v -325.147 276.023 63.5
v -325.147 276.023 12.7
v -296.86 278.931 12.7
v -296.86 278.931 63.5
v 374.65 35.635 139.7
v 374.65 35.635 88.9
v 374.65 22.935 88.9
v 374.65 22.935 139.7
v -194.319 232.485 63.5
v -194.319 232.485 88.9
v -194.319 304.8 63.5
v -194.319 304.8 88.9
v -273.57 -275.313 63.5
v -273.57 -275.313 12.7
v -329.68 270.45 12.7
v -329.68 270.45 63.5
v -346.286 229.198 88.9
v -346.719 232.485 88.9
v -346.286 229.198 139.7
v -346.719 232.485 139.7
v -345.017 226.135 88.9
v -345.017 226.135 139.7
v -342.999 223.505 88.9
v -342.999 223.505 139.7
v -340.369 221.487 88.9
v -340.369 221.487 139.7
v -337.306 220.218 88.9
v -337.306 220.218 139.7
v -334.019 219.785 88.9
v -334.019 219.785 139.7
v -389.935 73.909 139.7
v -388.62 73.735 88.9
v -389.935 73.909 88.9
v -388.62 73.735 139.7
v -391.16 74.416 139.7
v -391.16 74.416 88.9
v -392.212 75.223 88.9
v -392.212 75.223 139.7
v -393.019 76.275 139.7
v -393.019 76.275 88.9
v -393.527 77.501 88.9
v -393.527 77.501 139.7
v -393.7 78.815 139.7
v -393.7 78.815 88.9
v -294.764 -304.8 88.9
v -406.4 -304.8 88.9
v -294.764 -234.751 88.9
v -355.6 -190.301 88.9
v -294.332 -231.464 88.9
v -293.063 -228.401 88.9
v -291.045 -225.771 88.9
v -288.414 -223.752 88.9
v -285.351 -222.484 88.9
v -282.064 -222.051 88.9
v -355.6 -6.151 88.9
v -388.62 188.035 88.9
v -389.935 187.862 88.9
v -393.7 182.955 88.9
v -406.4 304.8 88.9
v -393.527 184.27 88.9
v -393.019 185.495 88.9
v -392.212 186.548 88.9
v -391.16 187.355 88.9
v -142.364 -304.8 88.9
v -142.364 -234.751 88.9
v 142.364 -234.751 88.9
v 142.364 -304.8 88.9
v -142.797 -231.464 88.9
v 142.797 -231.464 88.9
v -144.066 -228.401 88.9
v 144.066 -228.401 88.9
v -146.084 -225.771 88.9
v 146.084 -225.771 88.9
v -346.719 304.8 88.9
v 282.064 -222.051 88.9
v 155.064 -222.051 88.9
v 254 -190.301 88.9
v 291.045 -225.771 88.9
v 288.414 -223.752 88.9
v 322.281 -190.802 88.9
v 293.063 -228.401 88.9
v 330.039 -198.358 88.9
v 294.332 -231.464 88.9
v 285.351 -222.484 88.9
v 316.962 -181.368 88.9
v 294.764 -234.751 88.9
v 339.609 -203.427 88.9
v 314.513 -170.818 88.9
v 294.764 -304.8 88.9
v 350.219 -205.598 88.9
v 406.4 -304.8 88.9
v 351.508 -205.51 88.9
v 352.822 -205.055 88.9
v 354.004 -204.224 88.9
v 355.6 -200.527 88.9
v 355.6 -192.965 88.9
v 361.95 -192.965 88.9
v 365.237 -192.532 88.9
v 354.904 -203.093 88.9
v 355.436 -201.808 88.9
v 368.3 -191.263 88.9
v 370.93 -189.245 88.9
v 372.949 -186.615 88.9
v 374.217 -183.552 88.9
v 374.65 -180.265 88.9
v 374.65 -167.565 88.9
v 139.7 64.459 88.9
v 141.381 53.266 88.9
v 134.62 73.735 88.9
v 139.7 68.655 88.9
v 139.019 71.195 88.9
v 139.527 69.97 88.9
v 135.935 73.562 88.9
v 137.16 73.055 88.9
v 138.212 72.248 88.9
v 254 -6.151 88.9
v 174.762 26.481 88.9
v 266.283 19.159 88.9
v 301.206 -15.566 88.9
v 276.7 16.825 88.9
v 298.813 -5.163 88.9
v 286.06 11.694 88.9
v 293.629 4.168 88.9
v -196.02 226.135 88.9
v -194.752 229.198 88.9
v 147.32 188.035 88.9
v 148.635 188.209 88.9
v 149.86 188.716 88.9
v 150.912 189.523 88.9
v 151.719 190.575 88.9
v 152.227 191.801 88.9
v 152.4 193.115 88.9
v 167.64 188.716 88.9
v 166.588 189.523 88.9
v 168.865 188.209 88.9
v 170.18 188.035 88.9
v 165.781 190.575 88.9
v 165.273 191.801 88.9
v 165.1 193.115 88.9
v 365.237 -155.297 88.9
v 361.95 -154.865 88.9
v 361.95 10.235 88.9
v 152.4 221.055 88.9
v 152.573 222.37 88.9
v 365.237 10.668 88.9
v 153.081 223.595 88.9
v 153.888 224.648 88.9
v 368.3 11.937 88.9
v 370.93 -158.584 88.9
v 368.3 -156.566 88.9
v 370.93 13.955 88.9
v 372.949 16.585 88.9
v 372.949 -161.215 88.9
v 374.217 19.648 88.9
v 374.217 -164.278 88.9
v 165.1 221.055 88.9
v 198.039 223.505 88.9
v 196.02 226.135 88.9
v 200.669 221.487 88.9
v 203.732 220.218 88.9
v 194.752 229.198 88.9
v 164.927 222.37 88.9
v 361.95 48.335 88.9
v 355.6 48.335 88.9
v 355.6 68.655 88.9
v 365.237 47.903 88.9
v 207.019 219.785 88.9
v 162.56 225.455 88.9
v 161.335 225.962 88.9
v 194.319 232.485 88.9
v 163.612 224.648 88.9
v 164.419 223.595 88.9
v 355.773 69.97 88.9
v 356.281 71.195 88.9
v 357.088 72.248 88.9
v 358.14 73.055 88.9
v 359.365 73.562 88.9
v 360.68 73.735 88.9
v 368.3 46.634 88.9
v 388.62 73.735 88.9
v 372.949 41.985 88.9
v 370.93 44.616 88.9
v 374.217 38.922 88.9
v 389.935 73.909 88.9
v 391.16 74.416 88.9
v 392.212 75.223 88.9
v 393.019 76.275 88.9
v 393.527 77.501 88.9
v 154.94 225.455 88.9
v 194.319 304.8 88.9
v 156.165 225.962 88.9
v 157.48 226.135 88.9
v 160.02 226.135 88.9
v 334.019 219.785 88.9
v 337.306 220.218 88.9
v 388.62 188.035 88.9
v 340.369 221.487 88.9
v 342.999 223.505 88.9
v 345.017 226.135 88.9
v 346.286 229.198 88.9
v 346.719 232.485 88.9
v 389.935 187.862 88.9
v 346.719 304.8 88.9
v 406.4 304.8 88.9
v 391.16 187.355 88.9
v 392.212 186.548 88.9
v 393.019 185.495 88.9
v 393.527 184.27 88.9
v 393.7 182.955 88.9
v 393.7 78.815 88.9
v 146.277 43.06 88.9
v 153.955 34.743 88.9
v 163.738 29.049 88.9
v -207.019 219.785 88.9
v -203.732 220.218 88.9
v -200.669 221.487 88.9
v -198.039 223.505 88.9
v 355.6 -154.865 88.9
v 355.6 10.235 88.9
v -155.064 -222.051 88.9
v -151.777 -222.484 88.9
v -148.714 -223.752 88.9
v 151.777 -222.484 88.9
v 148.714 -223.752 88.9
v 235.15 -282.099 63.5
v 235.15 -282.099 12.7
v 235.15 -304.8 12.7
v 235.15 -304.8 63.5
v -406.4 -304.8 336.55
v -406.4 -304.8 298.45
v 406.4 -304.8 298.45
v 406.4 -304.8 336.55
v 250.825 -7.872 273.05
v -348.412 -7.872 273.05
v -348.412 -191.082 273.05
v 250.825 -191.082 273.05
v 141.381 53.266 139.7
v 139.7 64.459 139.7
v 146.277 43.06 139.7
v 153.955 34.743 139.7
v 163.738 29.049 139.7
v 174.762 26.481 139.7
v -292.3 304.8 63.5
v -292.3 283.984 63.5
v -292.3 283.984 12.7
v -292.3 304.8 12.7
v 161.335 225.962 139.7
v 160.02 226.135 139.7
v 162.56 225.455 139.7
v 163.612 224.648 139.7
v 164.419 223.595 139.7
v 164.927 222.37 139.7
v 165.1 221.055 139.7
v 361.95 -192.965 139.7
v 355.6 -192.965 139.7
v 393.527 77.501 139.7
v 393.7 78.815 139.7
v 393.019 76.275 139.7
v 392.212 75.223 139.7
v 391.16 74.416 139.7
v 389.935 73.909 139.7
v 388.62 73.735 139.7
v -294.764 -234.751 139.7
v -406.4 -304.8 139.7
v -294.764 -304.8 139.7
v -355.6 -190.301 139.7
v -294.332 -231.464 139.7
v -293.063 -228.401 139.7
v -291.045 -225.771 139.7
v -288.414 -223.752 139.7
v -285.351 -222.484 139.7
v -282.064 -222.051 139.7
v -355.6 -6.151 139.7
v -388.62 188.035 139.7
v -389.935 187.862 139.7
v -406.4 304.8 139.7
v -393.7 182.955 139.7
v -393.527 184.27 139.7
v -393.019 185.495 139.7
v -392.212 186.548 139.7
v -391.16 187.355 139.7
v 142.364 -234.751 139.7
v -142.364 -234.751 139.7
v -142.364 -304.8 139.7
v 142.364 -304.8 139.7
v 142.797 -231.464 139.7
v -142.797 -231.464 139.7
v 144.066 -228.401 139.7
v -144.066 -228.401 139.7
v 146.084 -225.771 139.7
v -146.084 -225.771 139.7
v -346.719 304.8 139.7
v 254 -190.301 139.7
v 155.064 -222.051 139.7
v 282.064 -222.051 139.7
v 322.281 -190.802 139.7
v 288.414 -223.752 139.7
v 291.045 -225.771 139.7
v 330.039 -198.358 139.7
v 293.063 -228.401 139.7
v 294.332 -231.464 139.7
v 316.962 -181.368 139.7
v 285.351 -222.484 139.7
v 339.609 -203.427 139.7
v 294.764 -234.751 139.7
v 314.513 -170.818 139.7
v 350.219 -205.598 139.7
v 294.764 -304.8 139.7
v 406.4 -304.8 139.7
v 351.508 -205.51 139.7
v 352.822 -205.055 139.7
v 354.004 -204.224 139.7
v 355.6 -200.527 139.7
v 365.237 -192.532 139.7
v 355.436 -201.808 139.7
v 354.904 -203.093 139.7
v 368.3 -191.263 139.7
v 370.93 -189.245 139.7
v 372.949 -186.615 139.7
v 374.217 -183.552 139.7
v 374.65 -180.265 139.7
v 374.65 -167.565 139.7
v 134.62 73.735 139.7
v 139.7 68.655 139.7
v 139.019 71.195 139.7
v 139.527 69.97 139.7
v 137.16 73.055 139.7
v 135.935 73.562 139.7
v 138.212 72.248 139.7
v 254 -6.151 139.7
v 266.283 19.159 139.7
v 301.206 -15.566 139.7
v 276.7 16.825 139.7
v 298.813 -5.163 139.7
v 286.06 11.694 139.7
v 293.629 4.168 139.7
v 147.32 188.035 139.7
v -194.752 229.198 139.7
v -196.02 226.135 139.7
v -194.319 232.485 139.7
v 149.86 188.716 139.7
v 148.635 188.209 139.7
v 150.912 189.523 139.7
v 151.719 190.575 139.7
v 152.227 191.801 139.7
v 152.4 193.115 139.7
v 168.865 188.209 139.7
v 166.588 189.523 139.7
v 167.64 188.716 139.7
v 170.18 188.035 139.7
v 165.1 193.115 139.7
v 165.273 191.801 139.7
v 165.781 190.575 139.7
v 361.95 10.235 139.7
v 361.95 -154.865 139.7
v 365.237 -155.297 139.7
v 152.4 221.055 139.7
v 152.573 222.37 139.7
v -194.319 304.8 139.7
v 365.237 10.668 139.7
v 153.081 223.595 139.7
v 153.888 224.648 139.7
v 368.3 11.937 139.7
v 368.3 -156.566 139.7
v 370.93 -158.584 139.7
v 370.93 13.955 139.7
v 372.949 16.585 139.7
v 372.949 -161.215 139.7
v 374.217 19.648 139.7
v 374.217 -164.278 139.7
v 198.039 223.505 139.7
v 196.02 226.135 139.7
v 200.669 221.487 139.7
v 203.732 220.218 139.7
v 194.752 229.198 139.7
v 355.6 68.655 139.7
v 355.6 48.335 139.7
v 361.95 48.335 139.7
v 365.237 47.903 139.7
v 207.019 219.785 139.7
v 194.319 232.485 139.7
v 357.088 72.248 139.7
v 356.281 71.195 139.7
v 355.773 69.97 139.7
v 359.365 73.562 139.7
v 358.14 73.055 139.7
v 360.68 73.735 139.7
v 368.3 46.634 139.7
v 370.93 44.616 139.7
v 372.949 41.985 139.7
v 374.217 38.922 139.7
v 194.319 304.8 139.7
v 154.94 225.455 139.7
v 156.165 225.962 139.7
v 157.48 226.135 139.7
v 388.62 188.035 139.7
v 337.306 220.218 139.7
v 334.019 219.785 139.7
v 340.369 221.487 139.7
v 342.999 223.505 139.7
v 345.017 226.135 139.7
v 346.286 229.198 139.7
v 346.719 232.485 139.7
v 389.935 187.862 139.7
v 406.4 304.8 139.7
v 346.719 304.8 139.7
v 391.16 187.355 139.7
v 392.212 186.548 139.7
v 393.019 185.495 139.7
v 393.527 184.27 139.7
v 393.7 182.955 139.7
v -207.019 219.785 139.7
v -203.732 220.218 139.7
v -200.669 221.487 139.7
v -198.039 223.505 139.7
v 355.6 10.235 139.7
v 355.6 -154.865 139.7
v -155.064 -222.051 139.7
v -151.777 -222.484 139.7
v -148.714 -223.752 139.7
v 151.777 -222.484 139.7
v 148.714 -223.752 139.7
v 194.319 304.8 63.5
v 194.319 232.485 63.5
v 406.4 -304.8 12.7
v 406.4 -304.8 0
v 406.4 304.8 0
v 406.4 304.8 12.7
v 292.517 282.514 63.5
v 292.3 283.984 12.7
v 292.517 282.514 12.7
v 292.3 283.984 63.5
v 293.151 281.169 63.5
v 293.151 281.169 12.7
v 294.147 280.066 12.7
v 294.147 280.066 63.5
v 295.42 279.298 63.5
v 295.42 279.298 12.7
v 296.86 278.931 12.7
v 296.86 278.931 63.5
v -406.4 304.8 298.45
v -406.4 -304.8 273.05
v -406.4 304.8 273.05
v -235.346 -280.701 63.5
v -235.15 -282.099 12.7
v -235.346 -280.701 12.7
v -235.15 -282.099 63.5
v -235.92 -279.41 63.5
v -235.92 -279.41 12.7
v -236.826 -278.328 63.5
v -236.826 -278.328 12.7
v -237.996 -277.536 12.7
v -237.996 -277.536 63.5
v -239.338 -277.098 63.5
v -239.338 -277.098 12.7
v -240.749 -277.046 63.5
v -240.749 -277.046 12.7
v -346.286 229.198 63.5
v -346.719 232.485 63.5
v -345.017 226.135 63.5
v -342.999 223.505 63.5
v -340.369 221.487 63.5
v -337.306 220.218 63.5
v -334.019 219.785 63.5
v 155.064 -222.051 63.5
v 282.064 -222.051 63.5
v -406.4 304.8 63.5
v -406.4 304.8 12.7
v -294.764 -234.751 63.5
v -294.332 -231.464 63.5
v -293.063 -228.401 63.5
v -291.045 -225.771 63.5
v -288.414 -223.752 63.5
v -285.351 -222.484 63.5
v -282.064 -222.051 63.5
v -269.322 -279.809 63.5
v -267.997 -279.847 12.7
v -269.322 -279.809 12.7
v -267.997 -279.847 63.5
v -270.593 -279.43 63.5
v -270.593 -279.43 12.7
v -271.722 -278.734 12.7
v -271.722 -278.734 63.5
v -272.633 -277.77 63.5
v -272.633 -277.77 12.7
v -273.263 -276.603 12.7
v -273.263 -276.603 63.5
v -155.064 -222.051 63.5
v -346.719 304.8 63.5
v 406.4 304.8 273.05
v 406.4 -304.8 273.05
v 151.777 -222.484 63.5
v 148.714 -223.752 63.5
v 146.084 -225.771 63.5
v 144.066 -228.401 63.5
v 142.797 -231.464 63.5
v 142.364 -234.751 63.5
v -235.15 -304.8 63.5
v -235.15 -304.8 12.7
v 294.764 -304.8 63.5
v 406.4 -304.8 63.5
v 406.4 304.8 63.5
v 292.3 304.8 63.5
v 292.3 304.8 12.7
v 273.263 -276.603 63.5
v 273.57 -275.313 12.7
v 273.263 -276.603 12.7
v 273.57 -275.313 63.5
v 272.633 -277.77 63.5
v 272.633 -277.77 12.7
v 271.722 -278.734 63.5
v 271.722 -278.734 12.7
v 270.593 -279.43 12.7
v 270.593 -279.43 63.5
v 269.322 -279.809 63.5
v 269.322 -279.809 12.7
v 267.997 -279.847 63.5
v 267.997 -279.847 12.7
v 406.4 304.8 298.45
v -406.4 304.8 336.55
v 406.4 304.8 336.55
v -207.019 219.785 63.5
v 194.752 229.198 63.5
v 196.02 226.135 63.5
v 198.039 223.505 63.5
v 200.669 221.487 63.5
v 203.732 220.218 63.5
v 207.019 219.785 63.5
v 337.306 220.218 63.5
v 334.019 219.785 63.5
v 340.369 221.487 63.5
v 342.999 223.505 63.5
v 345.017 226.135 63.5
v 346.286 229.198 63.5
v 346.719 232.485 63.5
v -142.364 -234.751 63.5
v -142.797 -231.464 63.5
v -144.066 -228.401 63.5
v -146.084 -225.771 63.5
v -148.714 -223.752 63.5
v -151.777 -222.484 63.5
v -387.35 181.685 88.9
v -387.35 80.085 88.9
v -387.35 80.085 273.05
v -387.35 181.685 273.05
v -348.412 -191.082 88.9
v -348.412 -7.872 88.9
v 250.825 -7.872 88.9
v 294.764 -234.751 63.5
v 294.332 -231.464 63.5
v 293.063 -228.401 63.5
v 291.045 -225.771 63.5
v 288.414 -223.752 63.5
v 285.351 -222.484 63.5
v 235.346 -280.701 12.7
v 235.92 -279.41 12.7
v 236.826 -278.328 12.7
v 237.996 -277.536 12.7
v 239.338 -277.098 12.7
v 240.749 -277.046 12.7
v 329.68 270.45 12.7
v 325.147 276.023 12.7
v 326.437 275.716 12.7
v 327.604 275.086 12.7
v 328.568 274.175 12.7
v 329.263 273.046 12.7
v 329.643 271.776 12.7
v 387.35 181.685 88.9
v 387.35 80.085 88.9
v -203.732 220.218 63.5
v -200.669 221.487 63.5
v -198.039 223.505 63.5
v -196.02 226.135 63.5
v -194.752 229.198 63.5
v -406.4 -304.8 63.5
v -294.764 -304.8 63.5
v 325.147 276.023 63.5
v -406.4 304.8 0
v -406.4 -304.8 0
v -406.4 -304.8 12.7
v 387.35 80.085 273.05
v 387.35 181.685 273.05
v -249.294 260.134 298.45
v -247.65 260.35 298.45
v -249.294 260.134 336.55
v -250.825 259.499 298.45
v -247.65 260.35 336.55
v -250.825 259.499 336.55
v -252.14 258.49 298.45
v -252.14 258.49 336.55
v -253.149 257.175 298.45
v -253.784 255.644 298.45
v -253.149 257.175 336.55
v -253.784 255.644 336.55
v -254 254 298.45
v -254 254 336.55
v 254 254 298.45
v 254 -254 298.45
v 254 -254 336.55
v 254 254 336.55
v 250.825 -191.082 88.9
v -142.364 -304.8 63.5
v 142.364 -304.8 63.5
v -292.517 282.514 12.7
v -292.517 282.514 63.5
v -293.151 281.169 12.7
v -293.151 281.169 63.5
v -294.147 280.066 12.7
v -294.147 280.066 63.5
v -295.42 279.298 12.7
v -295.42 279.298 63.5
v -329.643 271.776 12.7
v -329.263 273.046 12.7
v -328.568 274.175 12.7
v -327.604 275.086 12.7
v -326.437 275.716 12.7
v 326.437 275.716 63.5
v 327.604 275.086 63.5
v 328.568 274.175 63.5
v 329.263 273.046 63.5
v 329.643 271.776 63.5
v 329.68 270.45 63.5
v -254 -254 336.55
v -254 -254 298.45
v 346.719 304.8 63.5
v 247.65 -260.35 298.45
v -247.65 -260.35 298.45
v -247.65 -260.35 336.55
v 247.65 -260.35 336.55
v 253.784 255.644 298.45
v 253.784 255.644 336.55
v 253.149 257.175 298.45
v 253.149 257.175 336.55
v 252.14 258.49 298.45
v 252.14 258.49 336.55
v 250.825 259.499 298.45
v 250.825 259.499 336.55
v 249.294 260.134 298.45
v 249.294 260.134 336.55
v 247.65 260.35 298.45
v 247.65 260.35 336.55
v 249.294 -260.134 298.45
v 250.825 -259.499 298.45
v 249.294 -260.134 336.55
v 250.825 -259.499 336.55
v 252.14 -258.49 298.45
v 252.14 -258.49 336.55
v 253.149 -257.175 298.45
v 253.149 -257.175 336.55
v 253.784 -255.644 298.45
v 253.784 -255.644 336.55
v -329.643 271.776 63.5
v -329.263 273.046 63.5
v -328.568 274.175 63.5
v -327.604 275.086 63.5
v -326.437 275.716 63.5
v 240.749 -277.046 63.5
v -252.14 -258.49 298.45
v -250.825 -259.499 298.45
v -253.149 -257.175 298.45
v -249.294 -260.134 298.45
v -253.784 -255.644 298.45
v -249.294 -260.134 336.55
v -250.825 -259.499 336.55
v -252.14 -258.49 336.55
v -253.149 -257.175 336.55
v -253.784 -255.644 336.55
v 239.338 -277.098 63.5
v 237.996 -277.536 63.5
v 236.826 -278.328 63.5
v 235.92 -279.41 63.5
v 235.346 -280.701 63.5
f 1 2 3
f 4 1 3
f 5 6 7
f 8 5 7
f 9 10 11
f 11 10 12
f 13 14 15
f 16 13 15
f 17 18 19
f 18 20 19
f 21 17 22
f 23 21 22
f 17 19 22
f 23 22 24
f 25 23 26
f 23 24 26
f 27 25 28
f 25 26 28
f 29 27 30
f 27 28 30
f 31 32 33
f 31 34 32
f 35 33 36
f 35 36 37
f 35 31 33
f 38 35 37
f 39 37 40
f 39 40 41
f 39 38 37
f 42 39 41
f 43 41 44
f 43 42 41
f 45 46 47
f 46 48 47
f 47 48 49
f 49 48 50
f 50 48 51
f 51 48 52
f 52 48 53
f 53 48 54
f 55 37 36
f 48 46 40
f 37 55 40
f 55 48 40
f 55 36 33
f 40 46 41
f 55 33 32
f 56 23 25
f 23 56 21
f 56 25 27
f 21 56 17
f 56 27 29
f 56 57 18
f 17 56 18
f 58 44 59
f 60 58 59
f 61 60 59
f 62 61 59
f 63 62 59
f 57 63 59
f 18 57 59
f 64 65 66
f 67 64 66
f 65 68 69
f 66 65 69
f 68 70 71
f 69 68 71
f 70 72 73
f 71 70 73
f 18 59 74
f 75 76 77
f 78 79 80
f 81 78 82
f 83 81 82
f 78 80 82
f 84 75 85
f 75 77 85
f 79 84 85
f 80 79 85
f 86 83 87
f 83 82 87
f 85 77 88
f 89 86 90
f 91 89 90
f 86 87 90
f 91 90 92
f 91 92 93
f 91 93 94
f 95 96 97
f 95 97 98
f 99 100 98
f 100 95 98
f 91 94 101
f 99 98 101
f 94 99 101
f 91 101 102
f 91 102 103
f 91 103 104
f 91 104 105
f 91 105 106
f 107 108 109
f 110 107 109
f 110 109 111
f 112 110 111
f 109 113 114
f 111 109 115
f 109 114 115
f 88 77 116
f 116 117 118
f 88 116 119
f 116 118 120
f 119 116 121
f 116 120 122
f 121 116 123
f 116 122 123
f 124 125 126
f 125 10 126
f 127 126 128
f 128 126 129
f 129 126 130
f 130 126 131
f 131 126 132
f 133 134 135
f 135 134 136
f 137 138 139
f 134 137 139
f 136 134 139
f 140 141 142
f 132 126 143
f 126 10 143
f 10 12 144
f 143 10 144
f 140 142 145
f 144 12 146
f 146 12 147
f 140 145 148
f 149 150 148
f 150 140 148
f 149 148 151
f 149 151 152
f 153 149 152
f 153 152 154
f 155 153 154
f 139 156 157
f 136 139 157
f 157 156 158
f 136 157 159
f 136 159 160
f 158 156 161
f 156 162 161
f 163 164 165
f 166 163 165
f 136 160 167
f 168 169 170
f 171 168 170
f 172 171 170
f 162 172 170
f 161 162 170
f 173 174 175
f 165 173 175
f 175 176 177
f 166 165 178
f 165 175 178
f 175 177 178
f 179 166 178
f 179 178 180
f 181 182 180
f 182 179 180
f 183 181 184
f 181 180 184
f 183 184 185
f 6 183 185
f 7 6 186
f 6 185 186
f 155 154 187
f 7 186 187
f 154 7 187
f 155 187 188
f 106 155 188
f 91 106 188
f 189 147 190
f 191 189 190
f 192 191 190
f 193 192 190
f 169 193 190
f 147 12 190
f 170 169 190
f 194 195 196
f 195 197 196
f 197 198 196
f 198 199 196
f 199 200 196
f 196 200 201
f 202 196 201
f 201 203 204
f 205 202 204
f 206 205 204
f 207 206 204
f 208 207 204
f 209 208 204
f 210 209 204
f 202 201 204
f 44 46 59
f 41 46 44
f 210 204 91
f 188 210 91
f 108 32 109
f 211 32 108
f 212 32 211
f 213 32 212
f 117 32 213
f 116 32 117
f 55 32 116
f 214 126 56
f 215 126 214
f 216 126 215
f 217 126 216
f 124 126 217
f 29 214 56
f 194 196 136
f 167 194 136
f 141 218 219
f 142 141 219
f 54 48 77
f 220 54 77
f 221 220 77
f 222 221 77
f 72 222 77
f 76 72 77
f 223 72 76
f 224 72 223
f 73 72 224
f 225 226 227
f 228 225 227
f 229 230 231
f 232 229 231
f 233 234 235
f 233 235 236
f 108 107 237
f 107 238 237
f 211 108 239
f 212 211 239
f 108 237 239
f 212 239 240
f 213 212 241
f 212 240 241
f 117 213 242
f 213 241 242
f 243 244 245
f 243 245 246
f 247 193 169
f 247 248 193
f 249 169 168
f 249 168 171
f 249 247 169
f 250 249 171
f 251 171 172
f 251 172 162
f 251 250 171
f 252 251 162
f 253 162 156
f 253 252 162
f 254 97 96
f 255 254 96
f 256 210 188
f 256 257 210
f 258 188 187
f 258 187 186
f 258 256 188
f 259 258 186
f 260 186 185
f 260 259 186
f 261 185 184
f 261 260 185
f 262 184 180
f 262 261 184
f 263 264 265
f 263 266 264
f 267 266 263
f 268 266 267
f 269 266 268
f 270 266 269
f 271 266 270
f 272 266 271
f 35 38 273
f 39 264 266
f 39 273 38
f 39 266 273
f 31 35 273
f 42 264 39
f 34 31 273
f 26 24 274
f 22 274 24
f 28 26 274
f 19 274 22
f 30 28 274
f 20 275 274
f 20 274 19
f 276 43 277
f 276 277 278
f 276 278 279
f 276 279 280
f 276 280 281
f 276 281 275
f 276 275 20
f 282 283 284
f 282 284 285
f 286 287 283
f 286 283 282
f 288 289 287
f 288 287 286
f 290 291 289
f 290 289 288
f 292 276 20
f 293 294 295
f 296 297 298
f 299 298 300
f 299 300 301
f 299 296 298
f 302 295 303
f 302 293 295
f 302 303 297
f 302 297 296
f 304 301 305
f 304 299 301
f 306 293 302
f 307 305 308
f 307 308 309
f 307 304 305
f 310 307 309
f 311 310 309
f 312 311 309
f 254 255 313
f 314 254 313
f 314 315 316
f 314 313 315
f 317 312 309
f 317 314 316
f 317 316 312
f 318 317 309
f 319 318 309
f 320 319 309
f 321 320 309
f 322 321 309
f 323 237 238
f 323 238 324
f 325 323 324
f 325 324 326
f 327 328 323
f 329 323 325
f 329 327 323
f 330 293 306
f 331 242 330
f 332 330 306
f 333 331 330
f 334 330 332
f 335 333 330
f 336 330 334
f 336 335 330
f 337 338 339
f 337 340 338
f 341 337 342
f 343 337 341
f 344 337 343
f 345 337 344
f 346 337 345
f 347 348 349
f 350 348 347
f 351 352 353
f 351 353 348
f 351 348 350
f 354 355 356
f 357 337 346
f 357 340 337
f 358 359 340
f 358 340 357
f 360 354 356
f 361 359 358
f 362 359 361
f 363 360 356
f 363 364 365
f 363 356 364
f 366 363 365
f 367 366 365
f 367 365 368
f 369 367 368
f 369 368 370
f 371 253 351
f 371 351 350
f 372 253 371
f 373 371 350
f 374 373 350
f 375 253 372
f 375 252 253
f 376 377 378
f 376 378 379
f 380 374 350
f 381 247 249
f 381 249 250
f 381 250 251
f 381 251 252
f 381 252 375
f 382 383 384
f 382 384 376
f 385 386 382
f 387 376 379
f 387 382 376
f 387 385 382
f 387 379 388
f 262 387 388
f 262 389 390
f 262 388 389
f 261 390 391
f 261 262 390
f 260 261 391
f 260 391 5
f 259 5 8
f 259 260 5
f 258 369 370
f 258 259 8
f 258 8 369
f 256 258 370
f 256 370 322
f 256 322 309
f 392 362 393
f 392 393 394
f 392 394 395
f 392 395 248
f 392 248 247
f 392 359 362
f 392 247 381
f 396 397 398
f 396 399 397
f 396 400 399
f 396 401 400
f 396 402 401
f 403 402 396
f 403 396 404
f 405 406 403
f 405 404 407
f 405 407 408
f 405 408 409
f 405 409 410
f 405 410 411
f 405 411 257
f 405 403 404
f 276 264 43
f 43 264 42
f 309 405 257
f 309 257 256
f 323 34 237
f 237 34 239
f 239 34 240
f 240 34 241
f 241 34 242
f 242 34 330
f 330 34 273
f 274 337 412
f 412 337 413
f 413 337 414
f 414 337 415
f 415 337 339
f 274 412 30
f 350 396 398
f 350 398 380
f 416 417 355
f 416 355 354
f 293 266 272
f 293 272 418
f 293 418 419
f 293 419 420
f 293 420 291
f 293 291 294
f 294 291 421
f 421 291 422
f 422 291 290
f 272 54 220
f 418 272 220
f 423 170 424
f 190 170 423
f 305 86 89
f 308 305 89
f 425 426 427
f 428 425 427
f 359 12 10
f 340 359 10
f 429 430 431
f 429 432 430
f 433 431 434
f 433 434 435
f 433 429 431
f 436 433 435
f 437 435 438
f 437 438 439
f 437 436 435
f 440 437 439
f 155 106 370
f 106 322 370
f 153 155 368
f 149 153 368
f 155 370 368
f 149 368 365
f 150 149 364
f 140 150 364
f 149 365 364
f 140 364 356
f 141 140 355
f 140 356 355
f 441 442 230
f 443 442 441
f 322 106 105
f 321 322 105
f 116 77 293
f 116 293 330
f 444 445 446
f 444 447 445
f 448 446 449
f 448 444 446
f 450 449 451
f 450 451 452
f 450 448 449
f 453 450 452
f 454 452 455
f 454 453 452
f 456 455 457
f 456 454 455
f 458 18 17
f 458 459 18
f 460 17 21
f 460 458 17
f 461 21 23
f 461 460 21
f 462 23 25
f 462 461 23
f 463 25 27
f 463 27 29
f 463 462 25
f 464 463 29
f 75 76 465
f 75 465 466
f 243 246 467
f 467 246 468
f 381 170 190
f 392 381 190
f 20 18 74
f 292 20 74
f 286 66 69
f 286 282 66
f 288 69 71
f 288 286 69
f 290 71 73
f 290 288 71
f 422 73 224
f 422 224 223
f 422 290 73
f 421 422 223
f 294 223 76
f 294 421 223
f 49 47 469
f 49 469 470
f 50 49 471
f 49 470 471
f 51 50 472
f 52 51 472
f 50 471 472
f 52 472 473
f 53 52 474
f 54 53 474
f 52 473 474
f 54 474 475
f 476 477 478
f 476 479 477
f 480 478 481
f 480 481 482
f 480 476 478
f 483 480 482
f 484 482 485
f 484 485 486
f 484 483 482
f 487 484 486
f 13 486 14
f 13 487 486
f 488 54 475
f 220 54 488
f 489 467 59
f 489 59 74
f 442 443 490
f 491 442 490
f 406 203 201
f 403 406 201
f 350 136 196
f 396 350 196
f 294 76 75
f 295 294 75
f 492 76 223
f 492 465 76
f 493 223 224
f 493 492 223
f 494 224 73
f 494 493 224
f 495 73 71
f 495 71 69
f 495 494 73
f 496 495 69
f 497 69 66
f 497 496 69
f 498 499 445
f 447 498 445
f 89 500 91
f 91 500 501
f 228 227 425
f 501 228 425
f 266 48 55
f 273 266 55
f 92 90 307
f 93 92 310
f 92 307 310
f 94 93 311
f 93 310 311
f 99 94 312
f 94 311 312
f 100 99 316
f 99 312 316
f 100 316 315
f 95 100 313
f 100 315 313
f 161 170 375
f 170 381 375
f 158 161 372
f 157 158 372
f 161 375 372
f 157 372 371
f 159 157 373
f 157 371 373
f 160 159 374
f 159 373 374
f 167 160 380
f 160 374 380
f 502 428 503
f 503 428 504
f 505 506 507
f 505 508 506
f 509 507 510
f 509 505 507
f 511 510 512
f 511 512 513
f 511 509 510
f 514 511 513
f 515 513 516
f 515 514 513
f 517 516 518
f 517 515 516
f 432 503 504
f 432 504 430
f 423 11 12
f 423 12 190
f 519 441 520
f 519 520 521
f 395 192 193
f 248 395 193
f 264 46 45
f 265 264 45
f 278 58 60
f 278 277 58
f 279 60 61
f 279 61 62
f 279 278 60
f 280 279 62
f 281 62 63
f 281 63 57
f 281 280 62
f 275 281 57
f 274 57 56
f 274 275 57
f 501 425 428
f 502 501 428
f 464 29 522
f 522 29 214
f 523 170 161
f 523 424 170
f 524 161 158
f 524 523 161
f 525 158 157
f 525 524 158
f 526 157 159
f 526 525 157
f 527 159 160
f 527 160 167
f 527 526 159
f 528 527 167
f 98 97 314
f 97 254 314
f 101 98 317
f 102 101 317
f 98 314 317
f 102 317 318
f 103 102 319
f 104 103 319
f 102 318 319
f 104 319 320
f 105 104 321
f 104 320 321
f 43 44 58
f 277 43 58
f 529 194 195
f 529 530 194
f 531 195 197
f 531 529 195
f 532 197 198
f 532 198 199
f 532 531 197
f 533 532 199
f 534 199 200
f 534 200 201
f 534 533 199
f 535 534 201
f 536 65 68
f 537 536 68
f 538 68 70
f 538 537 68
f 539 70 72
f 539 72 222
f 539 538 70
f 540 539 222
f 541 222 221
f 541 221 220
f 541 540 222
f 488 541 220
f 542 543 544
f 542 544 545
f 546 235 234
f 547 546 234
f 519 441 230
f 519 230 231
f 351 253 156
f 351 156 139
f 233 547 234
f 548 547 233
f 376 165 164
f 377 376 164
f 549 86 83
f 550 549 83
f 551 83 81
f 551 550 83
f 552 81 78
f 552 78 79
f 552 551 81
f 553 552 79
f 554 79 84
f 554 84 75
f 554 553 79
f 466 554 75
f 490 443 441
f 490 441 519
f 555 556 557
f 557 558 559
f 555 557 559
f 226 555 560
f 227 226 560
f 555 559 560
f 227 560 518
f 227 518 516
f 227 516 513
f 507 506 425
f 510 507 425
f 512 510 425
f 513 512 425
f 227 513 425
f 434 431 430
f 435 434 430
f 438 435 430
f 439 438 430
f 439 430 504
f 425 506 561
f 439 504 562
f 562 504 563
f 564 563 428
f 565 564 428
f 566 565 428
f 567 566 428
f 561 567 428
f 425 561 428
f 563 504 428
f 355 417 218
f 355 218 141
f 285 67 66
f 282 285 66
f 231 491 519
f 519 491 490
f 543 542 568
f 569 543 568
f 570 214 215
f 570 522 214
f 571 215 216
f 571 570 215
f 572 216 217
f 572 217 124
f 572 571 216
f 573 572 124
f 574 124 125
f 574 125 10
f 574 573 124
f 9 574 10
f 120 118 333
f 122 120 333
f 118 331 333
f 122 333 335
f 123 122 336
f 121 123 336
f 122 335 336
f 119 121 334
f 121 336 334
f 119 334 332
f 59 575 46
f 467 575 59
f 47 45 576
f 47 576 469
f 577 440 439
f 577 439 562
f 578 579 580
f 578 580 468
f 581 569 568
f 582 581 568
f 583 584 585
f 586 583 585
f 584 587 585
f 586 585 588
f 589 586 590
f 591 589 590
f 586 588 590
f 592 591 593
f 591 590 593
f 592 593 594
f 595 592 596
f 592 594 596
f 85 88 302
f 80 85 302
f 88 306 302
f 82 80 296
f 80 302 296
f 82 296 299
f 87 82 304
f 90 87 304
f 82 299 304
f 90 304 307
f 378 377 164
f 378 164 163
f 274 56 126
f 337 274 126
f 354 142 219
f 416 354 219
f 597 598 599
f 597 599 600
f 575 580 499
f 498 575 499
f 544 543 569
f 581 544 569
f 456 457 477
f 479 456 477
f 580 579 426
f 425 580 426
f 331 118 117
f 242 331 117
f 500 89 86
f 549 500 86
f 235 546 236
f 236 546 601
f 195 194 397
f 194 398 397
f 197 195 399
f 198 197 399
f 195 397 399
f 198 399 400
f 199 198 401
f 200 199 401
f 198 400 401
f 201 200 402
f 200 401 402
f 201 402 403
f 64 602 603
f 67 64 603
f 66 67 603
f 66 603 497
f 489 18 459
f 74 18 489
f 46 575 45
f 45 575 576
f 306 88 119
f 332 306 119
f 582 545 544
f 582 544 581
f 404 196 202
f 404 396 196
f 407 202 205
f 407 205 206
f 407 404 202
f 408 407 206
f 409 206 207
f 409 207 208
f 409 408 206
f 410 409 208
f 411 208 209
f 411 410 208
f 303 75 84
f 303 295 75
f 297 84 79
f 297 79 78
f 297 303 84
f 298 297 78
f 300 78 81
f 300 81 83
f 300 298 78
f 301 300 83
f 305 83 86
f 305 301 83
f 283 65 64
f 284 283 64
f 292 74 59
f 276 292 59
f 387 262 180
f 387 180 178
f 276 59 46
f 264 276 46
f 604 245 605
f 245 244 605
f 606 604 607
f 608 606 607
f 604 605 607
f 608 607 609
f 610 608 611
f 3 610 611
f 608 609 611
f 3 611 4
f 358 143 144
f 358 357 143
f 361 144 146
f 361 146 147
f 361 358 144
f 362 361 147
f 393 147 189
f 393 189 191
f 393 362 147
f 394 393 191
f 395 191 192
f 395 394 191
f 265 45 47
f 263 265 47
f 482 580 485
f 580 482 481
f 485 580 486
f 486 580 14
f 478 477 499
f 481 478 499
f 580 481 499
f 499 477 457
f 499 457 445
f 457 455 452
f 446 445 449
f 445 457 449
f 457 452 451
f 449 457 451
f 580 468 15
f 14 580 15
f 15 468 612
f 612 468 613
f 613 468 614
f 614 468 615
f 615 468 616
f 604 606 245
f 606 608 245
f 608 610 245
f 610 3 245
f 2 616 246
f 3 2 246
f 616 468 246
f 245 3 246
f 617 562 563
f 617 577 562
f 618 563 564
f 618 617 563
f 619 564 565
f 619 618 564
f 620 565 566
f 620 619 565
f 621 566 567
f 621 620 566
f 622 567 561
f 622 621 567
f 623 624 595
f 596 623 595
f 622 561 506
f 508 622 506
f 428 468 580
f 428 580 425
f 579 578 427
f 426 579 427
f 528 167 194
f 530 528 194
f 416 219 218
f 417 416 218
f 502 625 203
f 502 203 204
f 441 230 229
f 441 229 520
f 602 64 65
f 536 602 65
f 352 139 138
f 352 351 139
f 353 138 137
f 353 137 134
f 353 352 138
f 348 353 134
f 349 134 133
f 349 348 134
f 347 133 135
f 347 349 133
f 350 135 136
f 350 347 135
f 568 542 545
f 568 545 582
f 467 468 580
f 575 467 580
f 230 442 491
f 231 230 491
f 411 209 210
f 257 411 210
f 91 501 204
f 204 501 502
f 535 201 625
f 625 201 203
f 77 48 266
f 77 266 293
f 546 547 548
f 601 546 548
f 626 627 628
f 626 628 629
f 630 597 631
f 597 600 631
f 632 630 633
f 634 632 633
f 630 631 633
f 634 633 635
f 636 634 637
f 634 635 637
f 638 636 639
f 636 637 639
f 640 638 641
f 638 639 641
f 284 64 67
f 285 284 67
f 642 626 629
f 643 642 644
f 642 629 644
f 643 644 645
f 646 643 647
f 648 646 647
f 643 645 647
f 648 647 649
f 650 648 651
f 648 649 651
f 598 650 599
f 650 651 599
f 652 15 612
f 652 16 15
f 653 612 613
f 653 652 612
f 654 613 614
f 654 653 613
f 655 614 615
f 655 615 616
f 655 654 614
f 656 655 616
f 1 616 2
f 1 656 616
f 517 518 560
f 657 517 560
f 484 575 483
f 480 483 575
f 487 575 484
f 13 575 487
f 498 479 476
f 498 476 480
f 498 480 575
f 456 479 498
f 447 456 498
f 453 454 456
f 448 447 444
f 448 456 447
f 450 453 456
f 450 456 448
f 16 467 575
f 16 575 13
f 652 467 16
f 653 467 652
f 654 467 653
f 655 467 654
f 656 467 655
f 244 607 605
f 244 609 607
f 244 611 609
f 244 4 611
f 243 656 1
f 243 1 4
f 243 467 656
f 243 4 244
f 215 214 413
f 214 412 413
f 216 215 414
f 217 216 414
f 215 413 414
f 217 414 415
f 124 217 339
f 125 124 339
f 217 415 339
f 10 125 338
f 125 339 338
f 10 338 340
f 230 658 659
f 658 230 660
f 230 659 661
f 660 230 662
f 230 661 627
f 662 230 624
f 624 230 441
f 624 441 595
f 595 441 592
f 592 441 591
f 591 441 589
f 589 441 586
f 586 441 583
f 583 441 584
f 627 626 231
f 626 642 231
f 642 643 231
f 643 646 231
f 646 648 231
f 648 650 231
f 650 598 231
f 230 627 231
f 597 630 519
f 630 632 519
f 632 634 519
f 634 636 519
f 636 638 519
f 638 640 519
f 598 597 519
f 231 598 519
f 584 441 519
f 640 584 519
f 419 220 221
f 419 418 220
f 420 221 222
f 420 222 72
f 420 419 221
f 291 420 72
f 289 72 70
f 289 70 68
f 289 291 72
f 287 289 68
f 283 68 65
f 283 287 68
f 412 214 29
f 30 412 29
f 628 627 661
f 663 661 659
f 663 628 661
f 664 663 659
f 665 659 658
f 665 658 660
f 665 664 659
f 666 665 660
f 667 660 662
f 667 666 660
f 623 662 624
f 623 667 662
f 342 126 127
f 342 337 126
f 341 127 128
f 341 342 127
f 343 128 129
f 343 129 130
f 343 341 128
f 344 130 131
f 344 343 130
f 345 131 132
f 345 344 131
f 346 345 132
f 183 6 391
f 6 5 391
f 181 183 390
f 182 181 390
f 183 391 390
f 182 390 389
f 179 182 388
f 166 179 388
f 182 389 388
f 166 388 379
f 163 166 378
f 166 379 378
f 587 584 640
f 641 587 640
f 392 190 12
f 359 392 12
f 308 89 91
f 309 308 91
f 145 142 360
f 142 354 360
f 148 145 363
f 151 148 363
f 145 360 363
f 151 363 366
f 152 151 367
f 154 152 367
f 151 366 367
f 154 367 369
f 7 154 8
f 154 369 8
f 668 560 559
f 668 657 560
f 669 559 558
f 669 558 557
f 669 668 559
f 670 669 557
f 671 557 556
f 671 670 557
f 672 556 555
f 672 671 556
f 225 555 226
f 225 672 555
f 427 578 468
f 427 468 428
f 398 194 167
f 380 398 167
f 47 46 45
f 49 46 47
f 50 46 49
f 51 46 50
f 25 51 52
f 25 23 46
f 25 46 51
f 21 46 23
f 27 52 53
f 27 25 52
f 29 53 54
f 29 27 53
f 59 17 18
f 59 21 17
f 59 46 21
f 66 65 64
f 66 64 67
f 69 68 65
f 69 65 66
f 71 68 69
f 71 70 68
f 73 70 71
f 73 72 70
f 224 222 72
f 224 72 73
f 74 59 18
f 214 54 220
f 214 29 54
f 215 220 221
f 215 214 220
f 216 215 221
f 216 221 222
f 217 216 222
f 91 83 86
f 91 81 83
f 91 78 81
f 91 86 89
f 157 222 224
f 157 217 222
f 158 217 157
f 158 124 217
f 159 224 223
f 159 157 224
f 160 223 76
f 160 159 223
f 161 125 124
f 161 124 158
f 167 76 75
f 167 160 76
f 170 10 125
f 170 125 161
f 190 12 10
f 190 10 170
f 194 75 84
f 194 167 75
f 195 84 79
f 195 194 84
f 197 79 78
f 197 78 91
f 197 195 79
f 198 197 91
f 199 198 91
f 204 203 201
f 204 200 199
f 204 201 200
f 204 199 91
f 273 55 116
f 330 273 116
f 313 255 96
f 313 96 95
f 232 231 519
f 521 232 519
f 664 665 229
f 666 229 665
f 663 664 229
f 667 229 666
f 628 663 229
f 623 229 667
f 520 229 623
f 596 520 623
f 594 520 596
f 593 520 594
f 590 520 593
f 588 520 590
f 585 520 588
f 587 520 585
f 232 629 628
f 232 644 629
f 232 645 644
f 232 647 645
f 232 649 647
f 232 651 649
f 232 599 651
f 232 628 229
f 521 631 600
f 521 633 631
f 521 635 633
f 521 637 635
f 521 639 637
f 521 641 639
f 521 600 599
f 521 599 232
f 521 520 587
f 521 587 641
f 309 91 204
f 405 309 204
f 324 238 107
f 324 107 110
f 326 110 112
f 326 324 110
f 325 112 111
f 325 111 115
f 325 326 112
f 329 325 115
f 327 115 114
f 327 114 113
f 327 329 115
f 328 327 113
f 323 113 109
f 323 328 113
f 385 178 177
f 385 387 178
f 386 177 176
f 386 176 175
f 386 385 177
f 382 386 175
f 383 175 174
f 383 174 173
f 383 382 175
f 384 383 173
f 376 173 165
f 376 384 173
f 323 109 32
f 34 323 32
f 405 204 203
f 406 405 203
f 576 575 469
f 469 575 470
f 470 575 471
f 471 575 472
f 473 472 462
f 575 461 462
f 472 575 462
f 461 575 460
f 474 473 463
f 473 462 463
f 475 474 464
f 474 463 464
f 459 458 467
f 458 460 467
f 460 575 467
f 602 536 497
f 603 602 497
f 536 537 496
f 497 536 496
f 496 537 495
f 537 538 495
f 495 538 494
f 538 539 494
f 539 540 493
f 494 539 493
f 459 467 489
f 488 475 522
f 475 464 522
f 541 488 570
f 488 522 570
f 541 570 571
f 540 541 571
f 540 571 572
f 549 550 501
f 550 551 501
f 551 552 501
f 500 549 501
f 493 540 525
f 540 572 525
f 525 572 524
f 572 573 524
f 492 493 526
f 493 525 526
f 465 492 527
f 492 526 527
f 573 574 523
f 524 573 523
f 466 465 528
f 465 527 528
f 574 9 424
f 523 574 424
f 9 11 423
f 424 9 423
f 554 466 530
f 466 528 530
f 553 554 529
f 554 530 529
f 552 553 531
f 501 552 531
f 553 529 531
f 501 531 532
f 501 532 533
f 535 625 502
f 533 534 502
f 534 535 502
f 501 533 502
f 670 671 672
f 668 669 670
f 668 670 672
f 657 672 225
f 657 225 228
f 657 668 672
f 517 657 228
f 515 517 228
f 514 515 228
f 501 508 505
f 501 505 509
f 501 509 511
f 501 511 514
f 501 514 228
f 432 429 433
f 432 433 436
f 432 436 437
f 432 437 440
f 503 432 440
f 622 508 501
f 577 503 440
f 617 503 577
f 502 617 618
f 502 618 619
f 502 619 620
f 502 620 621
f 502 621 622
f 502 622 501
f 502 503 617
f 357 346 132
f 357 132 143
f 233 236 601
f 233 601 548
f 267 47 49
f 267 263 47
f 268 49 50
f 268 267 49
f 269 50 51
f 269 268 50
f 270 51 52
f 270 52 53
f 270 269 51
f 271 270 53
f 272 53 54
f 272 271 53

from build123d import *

# Parameters (mm, degrees)
F0_W      = 812.8
F0_H      = 609.6
F1_DEPTH  = 12.7
F3_DEPTH  = 50.8
F5_W      = 812.8
F5_H      = 609.6
F6_DEPTH  = 25.4
F7_W      = 152.4
F7_H      = 82.7492105986
F7_H_2    = 85.014539755
F8_DEPTH  = 25.4
F9_W      = 609.6
F9_H      = 184.15
F10_DEPTH = 50.8
F12_W     = 812.8
F12_H     = 609.6
F13_DEPTH = 25.4
F14_W     = 812.8
F14_H     = 609.6
F14_W_2   = 508
F14_H_2   = 520.7
F15_DEPTH = 38.1
F16_R     = 38.1
F17_R     = 5.08
F18_W     = 774.7
F18_H     = 101.6
F19_DEPTH = 184.15
F18_W_2   = 599.2368
F18_H_2   = 183.2102
F20_R     = 6.35
F21_R     = 12.7
F21_2_R   = 12.7
F22_R     = 5.08
F22_2_R   = 5.08


# Not quite as in the source:
# - a feature names something its author has since deleted; it is built from what else it names


with BuildPart() as f1:
    # F0 (on Top) → F1 (new body)
    with BuildSketch(Plane.XY):
        Rectangle(F0_W, F0_H)
    extrude(amount=F1_DEPTH)


with BuildPart() as f3:
    # F2 (on face) → F3 (new body)
    with BuildSketch(Plane.XY.offset(12.7)):
        Polygon((-292.2997812765, 279.4), (-292.2997812765, 304.8), (-406.4, 304.8), (-406.4, -304.8), (-235.1497812765, -304.8), (-235.1497812765, -276.469874611), (-273.05, -280.36646552), (-330.2, 275.5034090909), align=None)
    extrude(amount=F3_DEPTH)

    # F22
    f22_edges = [f3.edges().sort_by_distance(p)[0] for p in [
        (-330.2, 275.503409, 38.1),
        (-292.299781, 279.4, 38.1),
        (-273.05, -280.366466, 38.1),
        (-235.149781, -276.469875, 38.1),
    ]]
    fillet(f22_edges, radius=F22_R)


with BuildPart() as f3b:
    # F2 (on face) → F3, piece 2 (new body)
    with BuildSketch(Plane.XY.offset(12.7)):
        Polygon((406.4, 304.8), (292.2997812765, 304.8), (292.2997812765, 279.4), (330.2, 275.5034090909), (273.05, -280.36646552), (235.1497812765, -276.469874611), (235.1497812765, -304.8), (406.4, -304.8), align=None)
    extrude(amount=F3_DEPTH)

    # F22#2
    f22_2_edges = [f3b.edges().sort_by_distance(p)[0] for p in [
        (330.2, 275.503409, 38.1),
        (292.299781, 279.4, 38.1),
        (273.05, -280.366466, 38.1),
        (235.149781, -276.469875, 38.1),
    ]]
    fillet(f22_2_edges, radius=F22_2_R)


with BuildPart() as f6:
    # F5 (on offset) → F6 (new body)
    with BuildSketch(Plane.XY.offset(63.5)):
        Rectangle(F5_W, F5_H)
    extrude(amount=F6_DEPTH)

    # F7 (on face) → F8 (cut)
    with BuildSketch(Plane.XY.offset(88.9)):
        with Locations((-218.5643210316, -263.4253947007)):
            Rectangle(F7_W, F7_H)
        with Locations((218.5643210316, -263.4253947007)):
            Rectangle(F7_W, F7_H)
        with Locations((-270.5188664861, 262.2927301225)):
            Rectangle(F7_W, F7_H_2)
        with Locations((270.5188664861, 262.2927301225)):
            Rectangle(F7_W, F7_H_2)
    extrude(amount=-F8_DEPTH, mode=Mode.SUBTRACT)

    # F21
    f21_edges = [f6.edges().sort_by_distance(p)[0] for p in [
        (-294.764321, -222.050789, 76.2),
        (-142.364321, -222.050789, 76.2),
        (294.764321, -222.050789, 76.2),
        (142.364321, -222.050789, 76.2),
        (346.718866, 219.78546, 76.2),
        (-346.718866, 219.78546, 76.2),
        (-194.318866, 219.78546, 76.2),
        (194.318866, 219.78546, 76.2),
    ]]
    fillet(f21_edges, radius=F21_R)


with BuildPart() as f10:
    # F9 (on face) → F10 (new body)
    with BuildSketch(Plane.XY.offset(88.9)):
        Polygon((-406.4, 304.8), (-406.4, -304.8), (-294.7643210316, -304.8), (-294.7643210316, -222.0507894014), (-142.3643210316, -222.0507894014), (-142.3643210316, -304.8), (142.3643210316, -304.8), (142.3643210316, -222.0507894014), (294.7643210316, -222.0507894014), (294.7643210316, -304.8), (406.4, -304.8), (406.4, 304.8), (346.7188664861, 304.8), (346.7188664861, 219.785460245), (194.3188664861, 219.785460245), (194.3188664861, 304.8), (-194.3188664861, 304.8), (-194.3188664861, 219.785460245), (-346.7188664861, 219.785460245), (-346.7188664861, 304.8), align=None)
        with Locations((-50.8, -98.2257894014)):
            Rectangle(F9_W, F9_H, mode=Mode.SUBTRACT)
        Polygon((-393.7, 73.735460245), (-393.7, 188.035460245), (152.4, 188.035460245), (152.4, 226.135460245), (165.1, 226.135460245), (165.1, 188.035460245), (393.7, 188.035460245), (393.7, 73.735460245), (355.6, 73.735460245), (355.6, 48.335460245), (374.65, 48.335460245), (374.65, 10.235460245), (355.6, 10.235460245), (355.6, -154.864539755), (374.65, -154.864539755), (374.65, -192.964539755), (355.6, -192.964539755), (355.6, -205.664539755), (317.5, -205.664539755), (298.45, 16.585460245), (139.7, 29.285460245), (139.7, 73.735460245), align=None, mode=Mode.SUBTRACT)
    extrude(amount=F10_DEPTH)

    # F16
    f16_edges = [f10.edges().sort_by_distance(p)[0] for p in [
        (139.7, 29.28546, 114.3),
        (298.45, 16.58546, 114.3),
        (317.5, -205.66454, 114.3),
    ]]
    fillet(f16_edges, radius=F16_R)

    # F17
    f17_edges = [f10.edges().sort_by_distance(p)[0] for p in [
        (139.7, 73.73546, 114.3),
        (152.4, 188.03546, 114.3),
        (165.1, 188.03546, 114.3),
        (393.7, 188.03546, 114.3),
        (393.7, 73.73546, 114.3),
        (355.6, 73.73546, 114.3),
        (355.6, -205.66454, 114.3),
        (-393.7, 188.03546, 114.3),
        (-393.7, 73.73546, 114.3),
        (165.1, 226.13546, 114.3),
        (152.4, 226.13546, 114.3),
    ]]
    fillet(f17_edges, radius=F17_R)

    # F21#2
    f21_2_edges = [f10.edges().sort_by_distance(p)[0] for p in [
        (-294.764321, -222.050789, 114.3),
        (-142.364321, -222.050789, 114.3),
        (294.764321, -222.050789, 114.3),
        (142.364321, -222.050789, 114.3),
        (-194.318866, 219.78546, 114.3),
        (194.318866, 219.78546, 114.3),
        (346.718866, 219.78546, 114.3),
        (-346.718866, 219.78546, 114.3),
        (374.65, 48.33546, 114.3),
        (374.65, -154.86454, 114.3),
        (374.65, 10.23546, 114.3),
        (374.65, -192.96454, 114.3),
    ]]
    fillet(f21_2_edges, radius=F21_2_R)


with BuildPart() as f13:
    # F12 (on offset) → F13 (new body)
    with BuildSketch(Plane.XY.offset(273.05)):
        Rectangle(F12_W, F12_H)
    extrude(amount=F13_DEPTH)


with BuildPart() as f15:
    # F14 (on face) → F15 (new body)
    with BuildSketch(Plane.XY.offset(298.45)):
        Rectangle(F14_W, F14_H)
        Rectangle(F14_W_2, F14_H_2, mode=Mode.SUBTRACT)
    extrude(amount=F15_DEPTH)

    # F20
    f20_edges = [f15.edges().sort_by_distance(p)[0] for p in [
        (-254, 260.35, 317.5),
        (254, 260.35, 317.5),
        (-254, -260.35, 317.5),
        (254, -260.35, 317.5),
    ]]
    fillet(f20_edges, radius=F20_R)


with BuildPart() as f19:
    # F18 (on face) → F19 (new body)
    with BuildSketch(Plane.XY.offset(88.9)):
        with Locations((0, 130.885460245)):
            Rectangle(F18_W, F18_H)
    extrude(amount=F19_DEPTH)


with BuildPart() as f19b:
    # F18 (on face) → F19, piece 2 (new body)
    with BuildSketch(Plane.XY.offset(88.9)):
        with Locations((-48.7934, -99.4771093487)):
            Rectangle(F18_W_2, F18_H_2)
    extrude(amount=F19_DEPTH)


solid = Compound([f1.part, f3.part, f3b.part, f6.part, f10.part, f13.part, f15.part, f19.part, f19b.part])
